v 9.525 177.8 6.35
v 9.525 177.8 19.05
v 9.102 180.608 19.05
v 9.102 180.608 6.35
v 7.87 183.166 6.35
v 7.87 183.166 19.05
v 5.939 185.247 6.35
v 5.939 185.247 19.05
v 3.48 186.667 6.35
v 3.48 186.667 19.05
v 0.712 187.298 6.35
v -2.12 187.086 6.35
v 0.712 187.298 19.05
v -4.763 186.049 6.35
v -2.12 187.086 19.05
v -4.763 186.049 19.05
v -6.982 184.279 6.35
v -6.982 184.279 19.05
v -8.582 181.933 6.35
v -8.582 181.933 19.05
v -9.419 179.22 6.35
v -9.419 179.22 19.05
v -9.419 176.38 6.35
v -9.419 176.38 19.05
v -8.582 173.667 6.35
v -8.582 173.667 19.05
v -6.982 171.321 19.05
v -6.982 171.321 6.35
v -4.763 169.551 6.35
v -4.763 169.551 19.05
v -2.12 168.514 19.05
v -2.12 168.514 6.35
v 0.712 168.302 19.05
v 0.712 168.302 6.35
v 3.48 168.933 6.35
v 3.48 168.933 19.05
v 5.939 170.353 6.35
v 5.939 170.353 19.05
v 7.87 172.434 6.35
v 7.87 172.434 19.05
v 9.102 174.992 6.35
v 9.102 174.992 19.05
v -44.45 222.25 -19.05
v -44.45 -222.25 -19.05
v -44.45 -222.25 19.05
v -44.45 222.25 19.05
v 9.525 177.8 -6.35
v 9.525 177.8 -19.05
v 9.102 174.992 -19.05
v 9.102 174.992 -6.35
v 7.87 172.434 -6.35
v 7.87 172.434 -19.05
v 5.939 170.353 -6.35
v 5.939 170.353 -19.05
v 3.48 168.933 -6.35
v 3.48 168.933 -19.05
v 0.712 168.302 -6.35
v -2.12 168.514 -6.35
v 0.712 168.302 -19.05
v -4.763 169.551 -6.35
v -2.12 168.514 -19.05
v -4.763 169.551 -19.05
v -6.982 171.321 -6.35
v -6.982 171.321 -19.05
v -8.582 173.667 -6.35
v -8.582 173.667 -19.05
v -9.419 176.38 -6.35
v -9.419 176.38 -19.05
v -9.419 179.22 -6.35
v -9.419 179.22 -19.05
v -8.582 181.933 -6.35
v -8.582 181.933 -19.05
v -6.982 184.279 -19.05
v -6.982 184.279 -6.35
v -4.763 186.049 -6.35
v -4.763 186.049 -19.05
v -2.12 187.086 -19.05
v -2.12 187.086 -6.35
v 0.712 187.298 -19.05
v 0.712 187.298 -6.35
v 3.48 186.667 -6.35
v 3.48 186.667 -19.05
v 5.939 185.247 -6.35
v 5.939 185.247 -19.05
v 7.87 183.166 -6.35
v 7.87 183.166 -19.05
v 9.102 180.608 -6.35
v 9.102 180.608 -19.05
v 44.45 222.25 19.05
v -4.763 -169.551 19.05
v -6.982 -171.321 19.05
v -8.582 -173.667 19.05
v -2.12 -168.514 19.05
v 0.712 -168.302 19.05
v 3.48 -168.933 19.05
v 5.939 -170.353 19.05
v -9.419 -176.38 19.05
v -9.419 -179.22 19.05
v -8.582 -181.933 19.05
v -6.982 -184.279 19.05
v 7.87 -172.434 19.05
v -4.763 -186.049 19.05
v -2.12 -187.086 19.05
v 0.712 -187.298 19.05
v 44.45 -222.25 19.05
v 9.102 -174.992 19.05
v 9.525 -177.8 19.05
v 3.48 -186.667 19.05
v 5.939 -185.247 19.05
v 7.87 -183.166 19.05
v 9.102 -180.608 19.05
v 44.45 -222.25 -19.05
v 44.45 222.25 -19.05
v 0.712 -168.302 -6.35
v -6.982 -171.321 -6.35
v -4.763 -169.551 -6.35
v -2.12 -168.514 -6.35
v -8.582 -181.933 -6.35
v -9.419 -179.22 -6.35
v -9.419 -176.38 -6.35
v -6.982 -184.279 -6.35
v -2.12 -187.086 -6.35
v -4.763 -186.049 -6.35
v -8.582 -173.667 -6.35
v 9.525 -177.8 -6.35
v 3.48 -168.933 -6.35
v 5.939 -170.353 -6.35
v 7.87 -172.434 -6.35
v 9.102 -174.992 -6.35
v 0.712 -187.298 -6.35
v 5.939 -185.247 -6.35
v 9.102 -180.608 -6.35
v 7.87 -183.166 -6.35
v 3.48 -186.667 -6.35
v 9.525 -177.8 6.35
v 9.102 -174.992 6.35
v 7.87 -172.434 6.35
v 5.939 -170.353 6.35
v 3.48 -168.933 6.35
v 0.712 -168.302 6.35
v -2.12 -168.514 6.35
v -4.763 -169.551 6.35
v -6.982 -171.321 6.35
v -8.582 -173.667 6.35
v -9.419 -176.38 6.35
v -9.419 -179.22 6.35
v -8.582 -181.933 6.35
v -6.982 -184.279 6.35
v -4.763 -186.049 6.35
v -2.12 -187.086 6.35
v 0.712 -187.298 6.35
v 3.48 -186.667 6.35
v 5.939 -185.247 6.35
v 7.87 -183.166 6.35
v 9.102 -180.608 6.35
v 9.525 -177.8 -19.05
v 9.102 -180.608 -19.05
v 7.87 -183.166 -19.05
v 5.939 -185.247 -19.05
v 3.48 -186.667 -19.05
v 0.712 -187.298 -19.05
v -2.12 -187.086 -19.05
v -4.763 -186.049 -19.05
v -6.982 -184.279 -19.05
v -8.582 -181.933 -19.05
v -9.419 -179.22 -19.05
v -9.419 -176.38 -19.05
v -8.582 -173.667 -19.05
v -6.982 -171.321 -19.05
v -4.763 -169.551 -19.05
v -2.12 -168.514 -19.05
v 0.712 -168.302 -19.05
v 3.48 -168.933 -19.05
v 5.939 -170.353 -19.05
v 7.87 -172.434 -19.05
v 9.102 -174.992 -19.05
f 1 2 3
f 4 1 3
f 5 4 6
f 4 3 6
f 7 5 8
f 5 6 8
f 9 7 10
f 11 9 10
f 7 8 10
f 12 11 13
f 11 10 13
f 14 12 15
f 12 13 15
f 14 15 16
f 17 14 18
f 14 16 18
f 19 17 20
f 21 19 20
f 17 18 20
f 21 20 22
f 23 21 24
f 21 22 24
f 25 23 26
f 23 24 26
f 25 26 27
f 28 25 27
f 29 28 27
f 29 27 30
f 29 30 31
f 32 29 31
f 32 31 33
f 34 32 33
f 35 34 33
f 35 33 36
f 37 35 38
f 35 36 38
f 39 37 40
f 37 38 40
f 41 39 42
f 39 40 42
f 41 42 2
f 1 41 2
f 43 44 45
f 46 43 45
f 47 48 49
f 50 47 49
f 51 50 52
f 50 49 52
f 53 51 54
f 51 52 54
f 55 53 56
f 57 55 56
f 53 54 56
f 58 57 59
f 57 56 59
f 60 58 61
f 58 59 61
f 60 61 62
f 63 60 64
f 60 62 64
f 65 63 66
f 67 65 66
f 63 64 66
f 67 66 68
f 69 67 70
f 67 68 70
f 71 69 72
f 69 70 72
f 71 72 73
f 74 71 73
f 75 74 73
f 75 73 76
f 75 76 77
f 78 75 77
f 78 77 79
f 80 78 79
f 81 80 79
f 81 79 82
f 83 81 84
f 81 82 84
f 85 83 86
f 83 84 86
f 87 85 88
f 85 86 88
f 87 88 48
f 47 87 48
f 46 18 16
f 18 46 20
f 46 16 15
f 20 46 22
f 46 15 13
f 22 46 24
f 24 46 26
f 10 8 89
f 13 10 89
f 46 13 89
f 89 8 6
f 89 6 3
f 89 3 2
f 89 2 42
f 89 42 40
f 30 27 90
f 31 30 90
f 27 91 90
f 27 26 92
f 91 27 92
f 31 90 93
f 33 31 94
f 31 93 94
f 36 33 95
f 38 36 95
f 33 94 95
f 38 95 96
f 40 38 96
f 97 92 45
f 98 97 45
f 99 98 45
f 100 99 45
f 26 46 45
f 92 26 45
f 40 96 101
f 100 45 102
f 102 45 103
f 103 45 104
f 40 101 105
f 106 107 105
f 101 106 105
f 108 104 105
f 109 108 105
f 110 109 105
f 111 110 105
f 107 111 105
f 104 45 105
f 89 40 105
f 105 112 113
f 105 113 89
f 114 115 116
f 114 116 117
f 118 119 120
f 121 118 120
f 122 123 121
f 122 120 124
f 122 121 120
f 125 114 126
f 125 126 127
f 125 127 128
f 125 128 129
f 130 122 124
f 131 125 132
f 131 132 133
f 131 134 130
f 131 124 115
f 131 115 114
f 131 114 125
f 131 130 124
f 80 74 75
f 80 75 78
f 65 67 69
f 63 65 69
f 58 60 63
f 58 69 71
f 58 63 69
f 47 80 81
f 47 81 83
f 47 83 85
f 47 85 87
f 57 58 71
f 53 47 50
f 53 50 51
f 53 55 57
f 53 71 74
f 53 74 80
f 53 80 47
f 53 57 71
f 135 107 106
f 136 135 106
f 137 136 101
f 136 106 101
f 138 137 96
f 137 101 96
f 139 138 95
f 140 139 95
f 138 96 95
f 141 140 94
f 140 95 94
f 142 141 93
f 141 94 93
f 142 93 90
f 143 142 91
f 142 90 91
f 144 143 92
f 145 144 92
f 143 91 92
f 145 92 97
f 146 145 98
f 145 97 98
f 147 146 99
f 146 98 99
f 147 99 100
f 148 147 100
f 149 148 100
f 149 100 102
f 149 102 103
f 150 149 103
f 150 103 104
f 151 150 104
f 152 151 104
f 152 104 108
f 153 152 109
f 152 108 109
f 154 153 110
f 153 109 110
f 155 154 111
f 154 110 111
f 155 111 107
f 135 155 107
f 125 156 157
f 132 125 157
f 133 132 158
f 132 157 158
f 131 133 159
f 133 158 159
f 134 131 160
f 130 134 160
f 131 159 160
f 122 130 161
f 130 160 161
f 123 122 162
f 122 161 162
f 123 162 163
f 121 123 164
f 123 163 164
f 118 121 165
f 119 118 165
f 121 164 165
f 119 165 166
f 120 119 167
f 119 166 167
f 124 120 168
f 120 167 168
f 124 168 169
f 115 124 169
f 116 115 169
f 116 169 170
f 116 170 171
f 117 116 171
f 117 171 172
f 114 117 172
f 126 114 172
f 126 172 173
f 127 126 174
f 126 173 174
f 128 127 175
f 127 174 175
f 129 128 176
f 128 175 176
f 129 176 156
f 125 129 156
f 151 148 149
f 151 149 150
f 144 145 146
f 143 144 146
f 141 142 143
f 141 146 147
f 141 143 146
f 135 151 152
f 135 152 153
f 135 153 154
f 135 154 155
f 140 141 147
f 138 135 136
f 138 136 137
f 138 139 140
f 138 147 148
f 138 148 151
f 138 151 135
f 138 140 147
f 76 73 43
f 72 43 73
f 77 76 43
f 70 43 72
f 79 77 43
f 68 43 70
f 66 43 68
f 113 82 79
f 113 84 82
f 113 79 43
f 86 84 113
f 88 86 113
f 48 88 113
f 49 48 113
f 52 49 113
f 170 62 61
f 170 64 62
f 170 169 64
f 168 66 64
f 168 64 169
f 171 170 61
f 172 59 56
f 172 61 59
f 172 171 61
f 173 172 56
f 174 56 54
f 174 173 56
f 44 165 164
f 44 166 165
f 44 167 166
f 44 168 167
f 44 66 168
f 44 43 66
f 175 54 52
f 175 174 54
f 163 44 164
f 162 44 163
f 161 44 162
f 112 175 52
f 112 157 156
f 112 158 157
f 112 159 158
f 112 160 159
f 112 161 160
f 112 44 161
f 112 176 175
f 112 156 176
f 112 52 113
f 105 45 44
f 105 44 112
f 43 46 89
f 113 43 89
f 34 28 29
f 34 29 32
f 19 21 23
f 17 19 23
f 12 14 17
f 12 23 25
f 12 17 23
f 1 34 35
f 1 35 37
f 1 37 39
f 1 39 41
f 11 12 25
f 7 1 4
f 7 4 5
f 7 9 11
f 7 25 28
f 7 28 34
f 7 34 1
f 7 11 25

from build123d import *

# Parameters (mm, degrees)
F0_W     = 88.9
F0_H     = 38.1
F1_DEPTH = 222.25
F2_R     = 9.525
F3_DEPTH = 12.7
F4_R     = 9.525
F5_DEPTH = 12.7


with BuildPart() as f1:
    # F0 (on Front) → F1 (new body, symmetric)
    with BuildSketch(Plane.XZ):
        Rectangle(F0_W, F0_H)
    extrude(amount=F1_DEPTH, both=True)

    # F2 (on face) → F3 (cut)
    with BuildSketch(Plane.XY.offset(19.05)):
        with Locations((0, 177.8)):
            Circle(F2_R)
        with Locations((0, -177.8)):
            Circle(F2_R)
    extrude(amount=-F3_DEPTH, mode=Mode.SUBTRACT)

    # F4 (on face) → F5 (cut)
    with BuildSketch(Plane(origin=(0, 0, -19.05), x_dir=(1, 0, 0), z_dir=(0, 0, -1))):
        with Locations((0, -177.8)):
            Circle(F4_R)
        with Locations((0, 177.8)):
            Circle(F4_R)
    extrude(amount=-F5_DEPTH, mode=Mode.SUBTRACT)


solid = f1.part
